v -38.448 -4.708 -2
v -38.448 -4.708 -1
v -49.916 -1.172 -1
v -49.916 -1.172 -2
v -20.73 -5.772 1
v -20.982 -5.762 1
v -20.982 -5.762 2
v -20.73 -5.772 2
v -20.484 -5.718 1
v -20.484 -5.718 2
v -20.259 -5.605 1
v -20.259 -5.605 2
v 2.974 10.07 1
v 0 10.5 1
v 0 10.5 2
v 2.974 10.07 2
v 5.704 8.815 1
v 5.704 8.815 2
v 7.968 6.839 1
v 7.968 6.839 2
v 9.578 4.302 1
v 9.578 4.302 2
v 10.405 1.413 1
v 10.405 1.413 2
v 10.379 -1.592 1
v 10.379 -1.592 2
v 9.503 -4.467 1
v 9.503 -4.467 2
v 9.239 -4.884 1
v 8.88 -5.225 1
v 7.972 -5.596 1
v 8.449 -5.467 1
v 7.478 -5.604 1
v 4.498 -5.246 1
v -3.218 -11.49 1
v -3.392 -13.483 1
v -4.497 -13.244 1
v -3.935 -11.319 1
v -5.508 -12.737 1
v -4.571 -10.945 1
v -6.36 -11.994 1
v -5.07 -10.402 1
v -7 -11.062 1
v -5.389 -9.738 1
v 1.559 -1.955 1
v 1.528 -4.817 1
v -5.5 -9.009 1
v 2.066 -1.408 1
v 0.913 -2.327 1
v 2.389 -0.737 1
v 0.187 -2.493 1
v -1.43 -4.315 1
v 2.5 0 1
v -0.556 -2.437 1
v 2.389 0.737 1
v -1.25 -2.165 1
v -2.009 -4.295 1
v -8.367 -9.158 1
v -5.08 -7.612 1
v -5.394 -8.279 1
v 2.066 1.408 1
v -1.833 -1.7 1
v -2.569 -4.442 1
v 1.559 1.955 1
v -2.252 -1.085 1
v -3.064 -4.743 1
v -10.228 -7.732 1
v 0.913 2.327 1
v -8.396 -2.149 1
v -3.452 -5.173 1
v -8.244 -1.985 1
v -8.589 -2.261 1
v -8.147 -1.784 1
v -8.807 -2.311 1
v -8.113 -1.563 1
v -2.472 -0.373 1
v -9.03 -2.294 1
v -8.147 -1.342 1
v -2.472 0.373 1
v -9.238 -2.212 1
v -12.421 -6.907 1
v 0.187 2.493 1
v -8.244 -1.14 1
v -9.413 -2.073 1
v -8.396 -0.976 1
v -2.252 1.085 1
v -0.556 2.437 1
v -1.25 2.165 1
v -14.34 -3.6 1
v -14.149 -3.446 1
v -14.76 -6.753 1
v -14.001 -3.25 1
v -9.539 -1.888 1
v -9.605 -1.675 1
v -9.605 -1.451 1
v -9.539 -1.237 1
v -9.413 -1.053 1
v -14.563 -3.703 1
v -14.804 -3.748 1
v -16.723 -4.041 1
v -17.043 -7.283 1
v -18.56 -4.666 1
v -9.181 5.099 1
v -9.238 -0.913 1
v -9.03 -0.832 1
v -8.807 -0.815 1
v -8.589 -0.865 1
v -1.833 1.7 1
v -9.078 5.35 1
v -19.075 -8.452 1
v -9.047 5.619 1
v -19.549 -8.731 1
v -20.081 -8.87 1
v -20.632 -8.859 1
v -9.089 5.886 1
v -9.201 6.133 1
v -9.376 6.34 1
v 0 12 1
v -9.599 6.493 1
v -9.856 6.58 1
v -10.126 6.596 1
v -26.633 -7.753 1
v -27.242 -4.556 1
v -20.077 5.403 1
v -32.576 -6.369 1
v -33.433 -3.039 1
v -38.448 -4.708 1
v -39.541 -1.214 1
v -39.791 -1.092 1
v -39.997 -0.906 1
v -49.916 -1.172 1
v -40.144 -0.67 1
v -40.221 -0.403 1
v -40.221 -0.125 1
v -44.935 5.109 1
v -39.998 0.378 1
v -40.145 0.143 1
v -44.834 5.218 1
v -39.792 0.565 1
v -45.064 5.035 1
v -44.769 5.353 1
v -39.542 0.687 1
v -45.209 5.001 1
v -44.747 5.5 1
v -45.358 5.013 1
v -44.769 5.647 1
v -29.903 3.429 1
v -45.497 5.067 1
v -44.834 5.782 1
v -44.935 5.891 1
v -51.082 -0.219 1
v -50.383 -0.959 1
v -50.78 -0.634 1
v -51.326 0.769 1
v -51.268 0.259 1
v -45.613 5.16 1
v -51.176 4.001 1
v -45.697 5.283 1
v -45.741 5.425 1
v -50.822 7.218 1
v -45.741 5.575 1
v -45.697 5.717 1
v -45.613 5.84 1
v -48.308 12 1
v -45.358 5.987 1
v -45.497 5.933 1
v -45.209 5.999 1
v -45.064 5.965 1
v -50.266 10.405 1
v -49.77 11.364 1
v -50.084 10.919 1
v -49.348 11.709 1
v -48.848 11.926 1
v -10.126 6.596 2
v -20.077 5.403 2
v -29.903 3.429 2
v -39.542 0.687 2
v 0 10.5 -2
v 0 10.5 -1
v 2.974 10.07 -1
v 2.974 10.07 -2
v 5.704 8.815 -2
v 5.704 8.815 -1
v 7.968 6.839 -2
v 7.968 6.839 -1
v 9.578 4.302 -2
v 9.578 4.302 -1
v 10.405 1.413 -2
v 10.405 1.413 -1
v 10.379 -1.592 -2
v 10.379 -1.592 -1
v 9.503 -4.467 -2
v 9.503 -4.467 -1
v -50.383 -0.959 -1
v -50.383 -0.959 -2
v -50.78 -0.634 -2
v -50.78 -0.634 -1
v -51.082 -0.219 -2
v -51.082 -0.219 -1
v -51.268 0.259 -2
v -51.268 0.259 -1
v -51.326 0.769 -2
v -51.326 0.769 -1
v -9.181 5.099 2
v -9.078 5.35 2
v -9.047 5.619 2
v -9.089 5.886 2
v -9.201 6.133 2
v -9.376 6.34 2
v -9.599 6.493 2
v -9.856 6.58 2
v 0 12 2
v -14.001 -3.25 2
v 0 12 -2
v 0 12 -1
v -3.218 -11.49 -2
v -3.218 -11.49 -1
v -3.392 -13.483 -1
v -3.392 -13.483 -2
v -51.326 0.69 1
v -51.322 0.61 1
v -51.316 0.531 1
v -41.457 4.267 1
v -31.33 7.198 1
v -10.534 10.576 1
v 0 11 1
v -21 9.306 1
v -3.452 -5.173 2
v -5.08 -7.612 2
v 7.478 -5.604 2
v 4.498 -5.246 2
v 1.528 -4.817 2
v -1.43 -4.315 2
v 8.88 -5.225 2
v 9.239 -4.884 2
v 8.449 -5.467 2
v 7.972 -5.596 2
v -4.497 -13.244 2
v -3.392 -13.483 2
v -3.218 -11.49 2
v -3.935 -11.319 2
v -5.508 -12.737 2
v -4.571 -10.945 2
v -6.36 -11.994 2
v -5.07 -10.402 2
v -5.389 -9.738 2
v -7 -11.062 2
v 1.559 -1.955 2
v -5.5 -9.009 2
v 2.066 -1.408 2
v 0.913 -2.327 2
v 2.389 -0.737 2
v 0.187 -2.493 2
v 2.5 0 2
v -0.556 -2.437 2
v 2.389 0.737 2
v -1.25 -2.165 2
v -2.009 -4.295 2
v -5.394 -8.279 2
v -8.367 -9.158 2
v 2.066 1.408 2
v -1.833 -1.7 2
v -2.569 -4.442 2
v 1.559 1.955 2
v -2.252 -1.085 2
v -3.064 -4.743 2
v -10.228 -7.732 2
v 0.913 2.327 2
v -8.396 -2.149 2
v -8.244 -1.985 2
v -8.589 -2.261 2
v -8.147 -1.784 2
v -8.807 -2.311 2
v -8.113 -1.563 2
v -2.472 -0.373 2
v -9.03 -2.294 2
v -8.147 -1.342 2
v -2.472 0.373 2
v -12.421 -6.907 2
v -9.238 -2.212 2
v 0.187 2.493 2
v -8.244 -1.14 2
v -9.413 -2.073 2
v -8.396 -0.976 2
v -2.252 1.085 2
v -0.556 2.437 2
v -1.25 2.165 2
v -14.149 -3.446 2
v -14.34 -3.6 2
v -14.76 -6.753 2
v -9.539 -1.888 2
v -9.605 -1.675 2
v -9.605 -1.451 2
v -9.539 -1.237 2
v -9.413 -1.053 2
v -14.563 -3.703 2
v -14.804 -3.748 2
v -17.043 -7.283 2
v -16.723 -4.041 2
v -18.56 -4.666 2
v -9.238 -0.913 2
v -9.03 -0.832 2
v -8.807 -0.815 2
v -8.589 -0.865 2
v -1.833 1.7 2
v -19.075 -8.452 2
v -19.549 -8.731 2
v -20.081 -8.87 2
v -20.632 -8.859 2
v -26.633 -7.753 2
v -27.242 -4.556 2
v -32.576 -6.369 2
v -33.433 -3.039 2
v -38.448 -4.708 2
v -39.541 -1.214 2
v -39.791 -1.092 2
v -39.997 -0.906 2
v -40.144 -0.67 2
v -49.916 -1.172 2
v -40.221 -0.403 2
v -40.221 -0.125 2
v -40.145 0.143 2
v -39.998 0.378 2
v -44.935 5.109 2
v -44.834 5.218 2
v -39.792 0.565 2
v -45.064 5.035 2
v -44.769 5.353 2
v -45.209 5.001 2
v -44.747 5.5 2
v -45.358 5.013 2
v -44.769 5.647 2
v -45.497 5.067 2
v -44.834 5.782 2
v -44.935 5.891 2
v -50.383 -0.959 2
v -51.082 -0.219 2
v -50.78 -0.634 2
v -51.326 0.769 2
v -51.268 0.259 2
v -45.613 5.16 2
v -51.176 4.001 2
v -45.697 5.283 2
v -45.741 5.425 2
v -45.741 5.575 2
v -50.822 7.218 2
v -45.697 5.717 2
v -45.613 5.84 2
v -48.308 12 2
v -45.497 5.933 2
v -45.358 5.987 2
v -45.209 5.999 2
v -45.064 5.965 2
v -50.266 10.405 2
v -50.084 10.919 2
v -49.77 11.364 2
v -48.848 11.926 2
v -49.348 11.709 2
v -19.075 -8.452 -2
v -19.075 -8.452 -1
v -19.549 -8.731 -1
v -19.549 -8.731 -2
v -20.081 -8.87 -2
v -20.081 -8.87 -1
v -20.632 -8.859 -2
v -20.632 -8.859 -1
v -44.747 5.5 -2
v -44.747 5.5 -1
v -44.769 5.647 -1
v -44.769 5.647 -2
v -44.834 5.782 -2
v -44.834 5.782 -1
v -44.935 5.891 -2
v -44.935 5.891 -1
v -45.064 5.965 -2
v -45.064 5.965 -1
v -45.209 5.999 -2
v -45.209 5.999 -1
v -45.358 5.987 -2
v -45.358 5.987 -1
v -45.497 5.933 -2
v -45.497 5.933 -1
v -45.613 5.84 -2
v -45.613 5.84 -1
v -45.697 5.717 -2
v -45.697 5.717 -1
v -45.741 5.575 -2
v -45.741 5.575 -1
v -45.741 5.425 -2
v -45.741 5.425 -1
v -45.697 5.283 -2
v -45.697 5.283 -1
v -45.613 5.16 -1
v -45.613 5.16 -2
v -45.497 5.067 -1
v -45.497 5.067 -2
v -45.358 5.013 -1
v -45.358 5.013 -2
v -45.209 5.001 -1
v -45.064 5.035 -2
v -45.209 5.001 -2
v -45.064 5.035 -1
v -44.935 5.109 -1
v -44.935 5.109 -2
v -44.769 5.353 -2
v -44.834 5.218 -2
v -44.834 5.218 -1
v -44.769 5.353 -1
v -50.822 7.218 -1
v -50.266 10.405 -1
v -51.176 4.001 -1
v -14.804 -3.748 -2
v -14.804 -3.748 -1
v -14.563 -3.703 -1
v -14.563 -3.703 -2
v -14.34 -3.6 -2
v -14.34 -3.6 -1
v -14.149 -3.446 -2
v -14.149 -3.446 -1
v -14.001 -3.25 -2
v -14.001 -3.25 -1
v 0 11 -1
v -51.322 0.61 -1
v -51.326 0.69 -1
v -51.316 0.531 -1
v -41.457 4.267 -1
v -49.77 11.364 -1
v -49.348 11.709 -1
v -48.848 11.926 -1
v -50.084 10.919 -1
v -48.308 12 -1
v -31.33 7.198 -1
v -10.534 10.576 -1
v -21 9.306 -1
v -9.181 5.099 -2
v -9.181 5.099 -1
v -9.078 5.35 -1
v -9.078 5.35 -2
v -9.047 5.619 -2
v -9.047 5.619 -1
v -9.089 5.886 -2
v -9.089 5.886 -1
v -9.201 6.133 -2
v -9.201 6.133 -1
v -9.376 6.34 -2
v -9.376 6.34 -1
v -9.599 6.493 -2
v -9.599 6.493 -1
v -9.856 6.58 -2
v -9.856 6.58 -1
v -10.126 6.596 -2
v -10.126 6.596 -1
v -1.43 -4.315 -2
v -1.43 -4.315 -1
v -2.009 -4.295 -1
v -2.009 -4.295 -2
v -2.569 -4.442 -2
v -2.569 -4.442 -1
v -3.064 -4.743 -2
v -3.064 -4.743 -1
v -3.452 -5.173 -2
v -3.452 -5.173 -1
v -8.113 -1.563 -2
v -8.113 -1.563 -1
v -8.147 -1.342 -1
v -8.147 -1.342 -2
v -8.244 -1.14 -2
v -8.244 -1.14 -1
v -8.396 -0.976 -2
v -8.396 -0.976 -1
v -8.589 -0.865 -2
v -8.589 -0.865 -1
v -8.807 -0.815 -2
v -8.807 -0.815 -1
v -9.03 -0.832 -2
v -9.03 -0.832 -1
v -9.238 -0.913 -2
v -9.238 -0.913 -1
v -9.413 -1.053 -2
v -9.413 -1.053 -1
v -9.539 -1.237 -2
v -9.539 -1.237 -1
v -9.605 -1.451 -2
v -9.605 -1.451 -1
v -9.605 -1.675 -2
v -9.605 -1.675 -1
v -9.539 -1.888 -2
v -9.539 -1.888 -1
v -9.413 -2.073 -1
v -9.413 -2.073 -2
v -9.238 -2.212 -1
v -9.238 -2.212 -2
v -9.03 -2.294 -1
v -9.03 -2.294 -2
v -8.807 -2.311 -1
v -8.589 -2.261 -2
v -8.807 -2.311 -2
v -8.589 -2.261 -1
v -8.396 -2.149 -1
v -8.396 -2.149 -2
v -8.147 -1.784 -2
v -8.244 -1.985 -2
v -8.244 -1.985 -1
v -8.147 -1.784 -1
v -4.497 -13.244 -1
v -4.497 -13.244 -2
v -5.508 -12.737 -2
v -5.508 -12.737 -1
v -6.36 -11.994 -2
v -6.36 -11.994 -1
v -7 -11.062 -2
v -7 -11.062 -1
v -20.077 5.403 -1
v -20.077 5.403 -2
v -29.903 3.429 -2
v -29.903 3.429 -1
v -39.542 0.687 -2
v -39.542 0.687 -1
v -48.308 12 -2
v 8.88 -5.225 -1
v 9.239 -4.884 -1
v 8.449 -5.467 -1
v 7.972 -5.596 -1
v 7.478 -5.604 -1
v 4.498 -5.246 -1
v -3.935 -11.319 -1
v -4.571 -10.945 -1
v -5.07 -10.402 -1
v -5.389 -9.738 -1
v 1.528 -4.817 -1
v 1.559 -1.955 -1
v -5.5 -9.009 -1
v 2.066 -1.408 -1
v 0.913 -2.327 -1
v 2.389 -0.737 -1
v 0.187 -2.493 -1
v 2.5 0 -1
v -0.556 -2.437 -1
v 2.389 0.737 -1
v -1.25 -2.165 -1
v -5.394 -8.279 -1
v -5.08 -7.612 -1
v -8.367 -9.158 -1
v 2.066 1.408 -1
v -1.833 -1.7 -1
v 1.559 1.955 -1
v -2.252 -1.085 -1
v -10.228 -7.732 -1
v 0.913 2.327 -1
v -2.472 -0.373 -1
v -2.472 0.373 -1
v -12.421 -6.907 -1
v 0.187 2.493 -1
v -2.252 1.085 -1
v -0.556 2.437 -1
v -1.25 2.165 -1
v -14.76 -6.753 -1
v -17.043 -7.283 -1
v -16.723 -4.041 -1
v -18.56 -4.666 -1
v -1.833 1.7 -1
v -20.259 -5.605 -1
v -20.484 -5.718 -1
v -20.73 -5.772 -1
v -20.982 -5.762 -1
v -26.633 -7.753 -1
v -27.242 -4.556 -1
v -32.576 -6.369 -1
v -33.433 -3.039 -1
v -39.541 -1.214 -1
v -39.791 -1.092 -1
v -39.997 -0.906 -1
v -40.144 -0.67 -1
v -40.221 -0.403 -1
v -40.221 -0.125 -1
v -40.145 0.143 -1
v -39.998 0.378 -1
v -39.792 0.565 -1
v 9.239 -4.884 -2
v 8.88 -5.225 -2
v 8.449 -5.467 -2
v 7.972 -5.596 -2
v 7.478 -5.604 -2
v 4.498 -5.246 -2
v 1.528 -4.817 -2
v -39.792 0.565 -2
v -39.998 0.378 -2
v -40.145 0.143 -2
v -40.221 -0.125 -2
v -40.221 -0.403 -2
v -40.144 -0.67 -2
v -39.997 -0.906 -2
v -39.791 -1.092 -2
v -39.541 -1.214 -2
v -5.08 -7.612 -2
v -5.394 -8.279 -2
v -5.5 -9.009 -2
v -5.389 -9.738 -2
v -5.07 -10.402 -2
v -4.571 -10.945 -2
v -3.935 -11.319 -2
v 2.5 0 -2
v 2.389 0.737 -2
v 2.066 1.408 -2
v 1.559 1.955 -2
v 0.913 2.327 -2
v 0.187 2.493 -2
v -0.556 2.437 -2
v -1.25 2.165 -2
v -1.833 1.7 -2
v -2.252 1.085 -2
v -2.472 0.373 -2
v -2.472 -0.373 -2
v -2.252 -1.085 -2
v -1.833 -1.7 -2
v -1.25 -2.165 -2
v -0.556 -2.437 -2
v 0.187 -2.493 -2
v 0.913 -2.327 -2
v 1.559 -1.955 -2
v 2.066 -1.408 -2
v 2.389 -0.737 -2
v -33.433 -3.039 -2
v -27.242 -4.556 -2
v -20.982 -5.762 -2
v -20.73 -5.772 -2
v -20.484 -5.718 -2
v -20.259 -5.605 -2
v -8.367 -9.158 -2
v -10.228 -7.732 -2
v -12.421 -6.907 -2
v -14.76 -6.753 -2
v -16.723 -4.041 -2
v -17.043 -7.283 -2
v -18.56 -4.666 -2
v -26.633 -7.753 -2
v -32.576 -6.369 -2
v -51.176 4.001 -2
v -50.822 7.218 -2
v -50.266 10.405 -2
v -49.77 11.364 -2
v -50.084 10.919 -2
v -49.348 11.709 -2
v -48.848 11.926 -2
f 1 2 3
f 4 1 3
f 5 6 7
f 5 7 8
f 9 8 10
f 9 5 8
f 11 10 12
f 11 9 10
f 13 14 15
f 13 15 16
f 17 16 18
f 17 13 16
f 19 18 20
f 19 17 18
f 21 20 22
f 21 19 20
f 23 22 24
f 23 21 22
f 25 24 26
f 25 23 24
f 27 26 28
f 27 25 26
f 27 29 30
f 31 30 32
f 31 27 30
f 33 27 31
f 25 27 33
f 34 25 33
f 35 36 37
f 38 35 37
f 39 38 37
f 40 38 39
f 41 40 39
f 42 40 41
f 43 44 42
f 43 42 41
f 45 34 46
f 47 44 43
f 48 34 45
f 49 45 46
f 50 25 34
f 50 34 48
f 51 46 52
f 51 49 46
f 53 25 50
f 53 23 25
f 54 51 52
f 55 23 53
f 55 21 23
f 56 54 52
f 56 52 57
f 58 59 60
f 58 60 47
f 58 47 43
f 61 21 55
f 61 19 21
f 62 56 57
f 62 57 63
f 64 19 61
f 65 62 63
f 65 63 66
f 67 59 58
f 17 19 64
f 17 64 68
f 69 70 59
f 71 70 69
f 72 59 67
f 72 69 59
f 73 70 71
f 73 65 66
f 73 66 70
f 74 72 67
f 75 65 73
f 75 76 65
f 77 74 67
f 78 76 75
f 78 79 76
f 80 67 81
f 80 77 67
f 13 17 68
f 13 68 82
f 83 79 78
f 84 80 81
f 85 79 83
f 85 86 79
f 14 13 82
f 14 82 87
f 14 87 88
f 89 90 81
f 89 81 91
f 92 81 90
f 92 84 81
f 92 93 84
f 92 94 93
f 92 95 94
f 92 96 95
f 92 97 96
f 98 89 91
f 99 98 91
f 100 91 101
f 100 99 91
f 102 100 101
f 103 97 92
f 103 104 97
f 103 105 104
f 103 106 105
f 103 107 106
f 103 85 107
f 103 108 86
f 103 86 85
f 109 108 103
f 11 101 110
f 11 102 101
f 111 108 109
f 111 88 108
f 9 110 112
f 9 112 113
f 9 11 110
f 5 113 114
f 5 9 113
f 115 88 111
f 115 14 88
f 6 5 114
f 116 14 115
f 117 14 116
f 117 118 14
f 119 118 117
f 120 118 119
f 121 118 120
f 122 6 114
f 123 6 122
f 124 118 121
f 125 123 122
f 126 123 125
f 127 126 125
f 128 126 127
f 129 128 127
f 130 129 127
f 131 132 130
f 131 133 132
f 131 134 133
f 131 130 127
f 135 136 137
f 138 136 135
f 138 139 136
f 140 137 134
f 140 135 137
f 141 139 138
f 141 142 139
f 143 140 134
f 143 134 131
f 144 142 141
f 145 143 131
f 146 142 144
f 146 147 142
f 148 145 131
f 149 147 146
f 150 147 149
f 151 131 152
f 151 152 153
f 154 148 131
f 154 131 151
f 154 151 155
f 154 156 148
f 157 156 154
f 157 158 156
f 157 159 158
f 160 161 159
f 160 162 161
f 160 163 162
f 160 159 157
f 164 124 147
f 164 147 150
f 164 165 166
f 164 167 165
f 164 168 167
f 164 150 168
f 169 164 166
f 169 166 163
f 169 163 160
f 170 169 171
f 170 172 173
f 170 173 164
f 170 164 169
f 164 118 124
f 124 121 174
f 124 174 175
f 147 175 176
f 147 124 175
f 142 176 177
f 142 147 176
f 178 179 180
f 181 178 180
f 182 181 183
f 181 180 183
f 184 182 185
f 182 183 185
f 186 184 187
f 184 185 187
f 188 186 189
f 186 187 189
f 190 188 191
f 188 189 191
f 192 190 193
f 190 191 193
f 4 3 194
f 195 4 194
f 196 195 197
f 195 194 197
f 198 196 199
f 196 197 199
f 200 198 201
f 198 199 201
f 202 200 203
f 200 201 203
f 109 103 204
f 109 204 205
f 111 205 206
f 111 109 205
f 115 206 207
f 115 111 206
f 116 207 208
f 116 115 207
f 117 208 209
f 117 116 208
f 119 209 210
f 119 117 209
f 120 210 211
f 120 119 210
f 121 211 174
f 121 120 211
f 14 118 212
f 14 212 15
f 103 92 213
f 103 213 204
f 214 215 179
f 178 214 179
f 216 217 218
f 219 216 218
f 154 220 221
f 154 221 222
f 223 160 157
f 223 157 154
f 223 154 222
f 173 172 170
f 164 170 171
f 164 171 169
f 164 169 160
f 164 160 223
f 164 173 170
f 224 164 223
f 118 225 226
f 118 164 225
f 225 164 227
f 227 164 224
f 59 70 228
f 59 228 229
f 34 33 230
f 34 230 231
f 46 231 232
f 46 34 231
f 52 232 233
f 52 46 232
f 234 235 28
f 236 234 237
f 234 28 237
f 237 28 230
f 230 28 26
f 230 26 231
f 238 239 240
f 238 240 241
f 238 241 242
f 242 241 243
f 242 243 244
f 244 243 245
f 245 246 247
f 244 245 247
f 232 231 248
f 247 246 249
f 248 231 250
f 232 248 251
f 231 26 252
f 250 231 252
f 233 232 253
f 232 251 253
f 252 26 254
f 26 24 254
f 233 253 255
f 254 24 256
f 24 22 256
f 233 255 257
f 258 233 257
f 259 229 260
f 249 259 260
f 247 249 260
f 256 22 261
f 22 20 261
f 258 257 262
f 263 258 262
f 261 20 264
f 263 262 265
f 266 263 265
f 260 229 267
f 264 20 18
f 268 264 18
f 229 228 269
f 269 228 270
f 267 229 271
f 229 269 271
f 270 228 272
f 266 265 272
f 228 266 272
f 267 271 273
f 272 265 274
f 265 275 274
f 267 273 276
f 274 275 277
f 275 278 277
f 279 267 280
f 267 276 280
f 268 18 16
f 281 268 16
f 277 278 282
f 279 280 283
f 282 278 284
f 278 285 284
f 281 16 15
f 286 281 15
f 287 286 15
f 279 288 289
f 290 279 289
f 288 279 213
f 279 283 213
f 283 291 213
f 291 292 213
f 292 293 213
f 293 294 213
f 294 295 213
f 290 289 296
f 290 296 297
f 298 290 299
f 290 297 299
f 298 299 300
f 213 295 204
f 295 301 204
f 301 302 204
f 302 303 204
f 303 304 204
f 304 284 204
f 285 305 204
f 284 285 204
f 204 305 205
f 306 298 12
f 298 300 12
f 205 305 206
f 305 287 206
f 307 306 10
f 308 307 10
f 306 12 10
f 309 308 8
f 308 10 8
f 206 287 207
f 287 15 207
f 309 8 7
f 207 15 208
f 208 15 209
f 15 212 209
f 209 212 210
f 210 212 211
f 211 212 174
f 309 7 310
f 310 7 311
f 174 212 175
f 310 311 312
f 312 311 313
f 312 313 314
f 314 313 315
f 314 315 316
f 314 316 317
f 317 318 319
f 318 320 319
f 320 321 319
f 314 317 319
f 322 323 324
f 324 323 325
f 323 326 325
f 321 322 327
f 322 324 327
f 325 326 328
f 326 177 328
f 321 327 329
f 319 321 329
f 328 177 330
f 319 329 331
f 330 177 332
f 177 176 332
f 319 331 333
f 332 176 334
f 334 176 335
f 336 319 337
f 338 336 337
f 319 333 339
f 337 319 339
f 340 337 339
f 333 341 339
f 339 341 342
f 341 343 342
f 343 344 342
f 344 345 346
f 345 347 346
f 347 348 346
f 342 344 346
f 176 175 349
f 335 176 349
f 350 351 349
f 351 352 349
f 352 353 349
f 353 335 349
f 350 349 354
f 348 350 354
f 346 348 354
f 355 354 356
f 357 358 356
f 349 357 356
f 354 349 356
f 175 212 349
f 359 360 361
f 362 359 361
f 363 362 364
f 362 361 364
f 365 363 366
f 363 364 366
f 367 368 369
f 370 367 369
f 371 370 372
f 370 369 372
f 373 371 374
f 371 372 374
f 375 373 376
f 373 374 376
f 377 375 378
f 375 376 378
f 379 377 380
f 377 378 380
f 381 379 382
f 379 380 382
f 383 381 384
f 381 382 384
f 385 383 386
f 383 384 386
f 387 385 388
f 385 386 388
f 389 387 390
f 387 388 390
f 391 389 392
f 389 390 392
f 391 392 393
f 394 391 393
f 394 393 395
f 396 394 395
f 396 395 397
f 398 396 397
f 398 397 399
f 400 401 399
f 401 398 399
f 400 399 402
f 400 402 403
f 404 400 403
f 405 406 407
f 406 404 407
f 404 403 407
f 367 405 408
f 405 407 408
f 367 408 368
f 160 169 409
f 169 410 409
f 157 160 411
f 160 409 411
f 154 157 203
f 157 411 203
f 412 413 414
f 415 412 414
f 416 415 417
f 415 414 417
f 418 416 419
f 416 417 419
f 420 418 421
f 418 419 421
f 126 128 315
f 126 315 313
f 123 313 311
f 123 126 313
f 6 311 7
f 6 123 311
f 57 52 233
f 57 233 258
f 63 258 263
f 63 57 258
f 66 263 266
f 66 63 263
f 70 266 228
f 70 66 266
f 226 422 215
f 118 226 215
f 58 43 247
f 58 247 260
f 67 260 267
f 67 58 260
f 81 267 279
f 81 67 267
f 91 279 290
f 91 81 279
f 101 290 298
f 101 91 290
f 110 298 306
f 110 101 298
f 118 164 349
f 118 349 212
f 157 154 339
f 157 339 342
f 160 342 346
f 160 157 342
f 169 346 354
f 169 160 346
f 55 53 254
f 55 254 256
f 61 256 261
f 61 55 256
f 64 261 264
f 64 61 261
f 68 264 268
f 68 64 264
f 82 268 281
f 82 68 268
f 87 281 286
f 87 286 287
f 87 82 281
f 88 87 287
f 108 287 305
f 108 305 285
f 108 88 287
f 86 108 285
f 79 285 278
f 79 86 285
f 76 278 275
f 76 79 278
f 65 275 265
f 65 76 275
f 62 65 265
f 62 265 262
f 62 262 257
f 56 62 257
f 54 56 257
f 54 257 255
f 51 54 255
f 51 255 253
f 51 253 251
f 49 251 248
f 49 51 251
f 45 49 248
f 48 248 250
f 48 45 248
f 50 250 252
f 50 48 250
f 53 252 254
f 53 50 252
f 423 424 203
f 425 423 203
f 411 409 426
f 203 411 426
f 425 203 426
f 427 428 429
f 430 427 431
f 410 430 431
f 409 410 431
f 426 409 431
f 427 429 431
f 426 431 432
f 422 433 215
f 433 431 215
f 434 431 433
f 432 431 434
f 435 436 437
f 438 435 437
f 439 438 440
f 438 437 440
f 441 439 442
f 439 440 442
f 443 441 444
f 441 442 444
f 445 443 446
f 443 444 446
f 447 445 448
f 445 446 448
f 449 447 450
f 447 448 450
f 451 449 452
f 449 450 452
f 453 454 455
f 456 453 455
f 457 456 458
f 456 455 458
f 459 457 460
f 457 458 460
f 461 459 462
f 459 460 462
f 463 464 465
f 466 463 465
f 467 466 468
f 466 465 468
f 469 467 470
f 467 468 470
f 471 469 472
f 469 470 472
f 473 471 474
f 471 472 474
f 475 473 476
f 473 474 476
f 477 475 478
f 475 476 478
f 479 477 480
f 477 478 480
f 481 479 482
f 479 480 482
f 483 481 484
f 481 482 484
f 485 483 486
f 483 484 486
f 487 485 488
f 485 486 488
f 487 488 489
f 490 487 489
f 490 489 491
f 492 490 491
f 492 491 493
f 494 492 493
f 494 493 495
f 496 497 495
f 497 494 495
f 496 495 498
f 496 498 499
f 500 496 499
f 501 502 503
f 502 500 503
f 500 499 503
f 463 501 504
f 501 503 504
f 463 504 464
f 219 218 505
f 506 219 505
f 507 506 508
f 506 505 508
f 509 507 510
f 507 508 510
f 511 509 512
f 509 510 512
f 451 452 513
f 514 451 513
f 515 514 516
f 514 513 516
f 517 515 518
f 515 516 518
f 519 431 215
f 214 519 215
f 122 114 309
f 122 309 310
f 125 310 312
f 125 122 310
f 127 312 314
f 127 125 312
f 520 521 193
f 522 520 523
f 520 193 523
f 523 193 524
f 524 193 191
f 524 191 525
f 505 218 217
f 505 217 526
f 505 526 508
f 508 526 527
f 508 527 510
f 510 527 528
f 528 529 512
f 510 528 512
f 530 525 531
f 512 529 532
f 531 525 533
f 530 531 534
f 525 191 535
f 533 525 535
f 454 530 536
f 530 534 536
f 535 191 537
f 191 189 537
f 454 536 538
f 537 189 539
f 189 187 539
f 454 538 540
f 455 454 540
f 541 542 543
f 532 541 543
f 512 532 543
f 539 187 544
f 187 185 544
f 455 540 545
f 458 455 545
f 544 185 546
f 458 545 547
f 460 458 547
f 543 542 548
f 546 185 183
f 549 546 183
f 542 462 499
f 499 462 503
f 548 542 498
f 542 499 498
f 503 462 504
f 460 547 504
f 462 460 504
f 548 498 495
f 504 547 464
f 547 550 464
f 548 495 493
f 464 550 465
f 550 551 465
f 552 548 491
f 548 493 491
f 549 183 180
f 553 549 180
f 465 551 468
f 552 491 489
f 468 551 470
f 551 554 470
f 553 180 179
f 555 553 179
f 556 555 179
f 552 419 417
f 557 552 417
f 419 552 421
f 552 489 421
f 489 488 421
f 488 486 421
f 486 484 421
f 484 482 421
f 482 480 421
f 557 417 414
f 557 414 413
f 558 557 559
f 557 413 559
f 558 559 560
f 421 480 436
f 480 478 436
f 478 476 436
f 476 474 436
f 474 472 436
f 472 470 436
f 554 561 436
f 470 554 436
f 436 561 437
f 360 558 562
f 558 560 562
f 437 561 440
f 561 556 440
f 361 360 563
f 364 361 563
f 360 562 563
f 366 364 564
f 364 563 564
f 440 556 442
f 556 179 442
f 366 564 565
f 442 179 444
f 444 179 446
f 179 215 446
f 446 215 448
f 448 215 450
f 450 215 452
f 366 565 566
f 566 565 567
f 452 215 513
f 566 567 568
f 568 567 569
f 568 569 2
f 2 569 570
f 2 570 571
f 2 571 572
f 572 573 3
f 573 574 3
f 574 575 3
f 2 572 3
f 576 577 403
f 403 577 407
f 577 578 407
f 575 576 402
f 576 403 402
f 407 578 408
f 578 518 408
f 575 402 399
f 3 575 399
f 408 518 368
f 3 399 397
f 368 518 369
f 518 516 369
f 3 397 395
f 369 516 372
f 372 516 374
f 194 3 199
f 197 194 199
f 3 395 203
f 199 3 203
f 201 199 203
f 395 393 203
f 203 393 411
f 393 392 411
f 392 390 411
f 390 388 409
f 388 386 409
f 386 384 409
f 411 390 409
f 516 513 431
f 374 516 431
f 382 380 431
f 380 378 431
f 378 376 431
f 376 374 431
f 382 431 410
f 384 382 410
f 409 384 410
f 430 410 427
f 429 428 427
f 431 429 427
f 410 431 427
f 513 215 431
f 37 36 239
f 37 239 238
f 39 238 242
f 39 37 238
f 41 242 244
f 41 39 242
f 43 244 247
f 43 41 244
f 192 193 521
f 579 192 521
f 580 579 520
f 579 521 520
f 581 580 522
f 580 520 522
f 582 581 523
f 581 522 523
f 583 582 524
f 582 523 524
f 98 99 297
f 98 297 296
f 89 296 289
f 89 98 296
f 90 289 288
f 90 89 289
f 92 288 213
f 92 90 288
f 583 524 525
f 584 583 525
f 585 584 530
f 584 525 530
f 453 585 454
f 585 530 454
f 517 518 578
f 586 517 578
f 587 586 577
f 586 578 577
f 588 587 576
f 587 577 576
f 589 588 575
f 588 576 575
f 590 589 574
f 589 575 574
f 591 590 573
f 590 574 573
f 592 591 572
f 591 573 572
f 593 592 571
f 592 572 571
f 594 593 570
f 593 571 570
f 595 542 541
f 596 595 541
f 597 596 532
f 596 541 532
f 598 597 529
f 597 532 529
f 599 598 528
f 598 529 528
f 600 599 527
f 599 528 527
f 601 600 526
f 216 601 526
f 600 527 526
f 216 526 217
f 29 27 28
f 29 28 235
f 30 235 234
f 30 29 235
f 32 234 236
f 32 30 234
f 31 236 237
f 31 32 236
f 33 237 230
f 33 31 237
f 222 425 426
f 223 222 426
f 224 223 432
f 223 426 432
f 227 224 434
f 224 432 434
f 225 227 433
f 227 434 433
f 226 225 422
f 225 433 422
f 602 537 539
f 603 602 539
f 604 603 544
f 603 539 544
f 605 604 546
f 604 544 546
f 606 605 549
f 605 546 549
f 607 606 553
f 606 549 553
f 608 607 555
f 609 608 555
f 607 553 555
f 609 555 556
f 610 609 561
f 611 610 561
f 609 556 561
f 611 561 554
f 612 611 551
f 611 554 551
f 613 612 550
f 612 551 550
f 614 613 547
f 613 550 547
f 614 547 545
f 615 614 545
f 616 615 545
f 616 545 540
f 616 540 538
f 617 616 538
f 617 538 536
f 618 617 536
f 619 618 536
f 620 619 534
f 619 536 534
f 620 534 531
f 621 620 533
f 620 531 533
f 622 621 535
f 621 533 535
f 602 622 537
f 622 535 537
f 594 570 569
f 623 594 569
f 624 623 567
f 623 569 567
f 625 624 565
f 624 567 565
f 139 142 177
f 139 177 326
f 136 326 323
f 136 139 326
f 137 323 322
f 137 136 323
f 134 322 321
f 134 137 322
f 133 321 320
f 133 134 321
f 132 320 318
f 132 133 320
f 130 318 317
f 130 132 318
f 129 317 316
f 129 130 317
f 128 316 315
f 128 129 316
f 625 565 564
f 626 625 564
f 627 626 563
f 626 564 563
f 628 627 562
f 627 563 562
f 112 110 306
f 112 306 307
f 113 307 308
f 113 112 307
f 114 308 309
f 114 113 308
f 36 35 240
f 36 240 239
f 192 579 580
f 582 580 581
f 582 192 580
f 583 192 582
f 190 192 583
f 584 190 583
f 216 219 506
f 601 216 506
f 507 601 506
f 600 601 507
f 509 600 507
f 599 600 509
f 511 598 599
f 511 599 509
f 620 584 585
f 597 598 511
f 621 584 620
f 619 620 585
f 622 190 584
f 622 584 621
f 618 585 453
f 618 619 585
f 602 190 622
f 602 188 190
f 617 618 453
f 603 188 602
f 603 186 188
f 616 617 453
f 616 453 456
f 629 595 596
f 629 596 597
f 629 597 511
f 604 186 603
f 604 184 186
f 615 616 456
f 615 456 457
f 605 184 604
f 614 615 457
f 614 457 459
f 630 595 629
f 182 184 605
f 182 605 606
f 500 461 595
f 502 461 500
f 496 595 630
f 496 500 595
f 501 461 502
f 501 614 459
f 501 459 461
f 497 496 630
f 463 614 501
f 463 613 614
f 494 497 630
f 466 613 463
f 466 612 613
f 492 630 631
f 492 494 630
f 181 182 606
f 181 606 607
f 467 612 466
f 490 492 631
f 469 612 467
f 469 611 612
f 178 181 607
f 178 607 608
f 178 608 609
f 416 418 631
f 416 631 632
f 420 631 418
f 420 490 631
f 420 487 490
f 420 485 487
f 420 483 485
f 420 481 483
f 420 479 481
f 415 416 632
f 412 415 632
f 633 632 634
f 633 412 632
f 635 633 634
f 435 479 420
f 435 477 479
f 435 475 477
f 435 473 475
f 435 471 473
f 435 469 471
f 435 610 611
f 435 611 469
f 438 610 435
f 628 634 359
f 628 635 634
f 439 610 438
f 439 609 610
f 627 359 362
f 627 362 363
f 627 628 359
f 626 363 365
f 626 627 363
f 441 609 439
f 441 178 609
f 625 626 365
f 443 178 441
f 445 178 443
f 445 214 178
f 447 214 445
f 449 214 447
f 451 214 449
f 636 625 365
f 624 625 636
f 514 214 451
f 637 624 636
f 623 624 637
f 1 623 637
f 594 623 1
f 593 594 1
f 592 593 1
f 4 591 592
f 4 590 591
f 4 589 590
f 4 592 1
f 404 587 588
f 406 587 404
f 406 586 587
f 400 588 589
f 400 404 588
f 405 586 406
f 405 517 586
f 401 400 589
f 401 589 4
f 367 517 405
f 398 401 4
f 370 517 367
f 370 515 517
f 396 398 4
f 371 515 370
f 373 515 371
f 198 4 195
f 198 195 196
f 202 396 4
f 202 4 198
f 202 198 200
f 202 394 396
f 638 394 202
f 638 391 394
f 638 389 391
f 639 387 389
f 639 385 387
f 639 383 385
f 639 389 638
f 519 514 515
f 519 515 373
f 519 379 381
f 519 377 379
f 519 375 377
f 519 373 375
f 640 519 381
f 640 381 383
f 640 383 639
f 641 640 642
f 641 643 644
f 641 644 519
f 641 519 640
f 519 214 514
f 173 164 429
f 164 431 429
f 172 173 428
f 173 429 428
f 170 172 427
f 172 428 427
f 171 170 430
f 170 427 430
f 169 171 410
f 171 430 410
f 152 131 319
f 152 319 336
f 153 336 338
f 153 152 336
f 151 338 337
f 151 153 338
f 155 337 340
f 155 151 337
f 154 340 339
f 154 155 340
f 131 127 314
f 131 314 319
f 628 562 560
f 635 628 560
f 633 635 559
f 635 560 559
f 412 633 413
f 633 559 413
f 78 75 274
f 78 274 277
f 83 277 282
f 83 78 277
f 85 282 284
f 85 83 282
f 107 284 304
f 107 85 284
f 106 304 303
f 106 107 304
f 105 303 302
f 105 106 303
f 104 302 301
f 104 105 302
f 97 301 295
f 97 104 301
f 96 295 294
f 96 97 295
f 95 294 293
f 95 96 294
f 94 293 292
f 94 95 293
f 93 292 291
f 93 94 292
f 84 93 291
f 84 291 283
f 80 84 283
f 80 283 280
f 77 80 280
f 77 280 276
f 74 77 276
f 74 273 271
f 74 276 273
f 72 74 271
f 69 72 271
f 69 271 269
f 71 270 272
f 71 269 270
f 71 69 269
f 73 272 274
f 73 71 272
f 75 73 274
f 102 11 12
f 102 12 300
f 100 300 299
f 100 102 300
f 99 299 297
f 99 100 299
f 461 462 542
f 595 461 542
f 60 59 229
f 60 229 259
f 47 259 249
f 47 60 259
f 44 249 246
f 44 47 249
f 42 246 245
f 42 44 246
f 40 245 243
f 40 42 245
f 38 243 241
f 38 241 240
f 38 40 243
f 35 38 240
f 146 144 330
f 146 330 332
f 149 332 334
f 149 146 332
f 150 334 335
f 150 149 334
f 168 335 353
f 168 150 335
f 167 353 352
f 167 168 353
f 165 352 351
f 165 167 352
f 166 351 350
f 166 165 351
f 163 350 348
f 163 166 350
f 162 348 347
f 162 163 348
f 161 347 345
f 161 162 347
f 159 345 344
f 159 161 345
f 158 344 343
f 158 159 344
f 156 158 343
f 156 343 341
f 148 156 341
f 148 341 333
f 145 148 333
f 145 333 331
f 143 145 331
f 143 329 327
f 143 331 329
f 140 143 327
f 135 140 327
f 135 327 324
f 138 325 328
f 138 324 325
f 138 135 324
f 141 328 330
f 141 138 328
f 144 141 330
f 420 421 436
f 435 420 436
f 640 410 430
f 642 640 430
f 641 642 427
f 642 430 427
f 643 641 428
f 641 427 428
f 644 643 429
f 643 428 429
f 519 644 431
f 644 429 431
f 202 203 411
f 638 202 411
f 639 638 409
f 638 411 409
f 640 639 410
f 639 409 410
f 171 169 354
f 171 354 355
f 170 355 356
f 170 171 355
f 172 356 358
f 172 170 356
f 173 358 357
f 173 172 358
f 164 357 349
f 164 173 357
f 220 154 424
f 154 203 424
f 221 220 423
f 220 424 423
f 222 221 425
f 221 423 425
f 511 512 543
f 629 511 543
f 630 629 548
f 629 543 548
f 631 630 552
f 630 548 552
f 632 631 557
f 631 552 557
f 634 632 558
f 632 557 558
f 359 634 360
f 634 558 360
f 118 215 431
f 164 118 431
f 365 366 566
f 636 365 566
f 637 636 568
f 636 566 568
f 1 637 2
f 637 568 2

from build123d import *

# Parameters (mm, degrees)
SKICA1_R                 = 2.5
P_IDAT_VYSUNUT_M1_DEPTH  = 1
ODEBRAT_VYSUNUT_M3_DEPTH = 54.105492035
SKICA2_R                 = 0.75
SKICA2_R_2               = 0.5
ODEBRAT_VYSUNUT_M2_DEPTH = 54.105492035
P_IDAT_VYSUNUT_M2_DEPTH  = 1


with BuildPart() as part:
    # Skica1 → Přidat vysunutím1 (new body)
    with BuildSketch(Plane.XY.offset(1)):
        with BuildLine():
            Line((-3.451850397, -5.17306034), (-5.079542319, -7.612374783))
            ThreePointArc((-5.079542319, -7.612374783), (-5.253771545, -10.081902872), (-3.217889357, -11.490486745))
            Line((-3.217889357, -11.490486745), (-3.392200842, -13.482876141))
            ThreePointArc((-3.392200842, -13.482876141), (-5.507699887, -12.736501208), (-7, -11.061552813))
            ThreePointArc((-7, -11.061552813), (-12.421451418, -6.907005546), (-19.074569669, -8.452455647))
            ThreePointArc((-19.074569669, -8.452455647), (-19.810429728, -8.819128255), (-20.631627839, -8.858782909))
            ThreePointArc((-20.631627839, -8.858782909), (-29.612816832, -7.095755552), (-38.448343472, -4.707557447))
            Line((-38.448343472, -4.707557447), (-49.915705076, -1.172077587))
            ThreePointArc((-49.915705076, -1.172077587), (-50.944425281, -0.436513563), (-51.326233925, 0.769115673))
            ThreePointArc((-51.326233925, 0.769115673), (-51.024263074, 5.612344033), (-50.266302206, 10.405416394))
            ThreePointArc((-50.266302206, 10.405416394), (-49.570592062, 11.550940487), (-48.307823831, 12))
            Line((-48.307823831, 12), (0, 12))
            Line((0, 12), (0, 10.5))
            ThreePointArc((0, 10.5), (8.864205709, 5.628130874), (9.502649492, -4.466503402))
            ThreePointArc((9.502649492, -4.466503402), (8.672376262, -5.35932327), (7.478006155, -5.604192624))
            ThreePointArc((7.478006155, -5.604192624), (3.01210543, -5.04033823), (-1.430493256, -4.315412042))
            ThreePointArc((-1.430493256, -4.315412042), (-2.569395622, -4.442030631), (-3.451850397, -5.17306034))
        make_face()
        Circle(SKICA1_R, mode=Mode.SUBTRACT)
    extrude(amount=P_IDAT_VYSUNUT_M1_DEPTH)

    # Skica14 → Odebrat vysunutím3 (cut, through all)
    with BuildSketch(Plane.XY):
        with BuildLine():
            Line((-14.000954762, -3.250365002), (-9.180543984, 5.098831378))
            ThreePointArc((-9.180543984, 5.098831378), (-9.201183144, 6.132986878), (-10.126304066, 6.5956475))
            ThreePointArc((-10.126304066, 6.5956475), (-25.0093231, 4.513187085), (-39.5421575, 0.687272652))
            ThreePointArc((-39.5421575, 0.687272652), (-40.23080172, -0.263668209), (-39.540926846, -1.21371665))
            ThreePointArc((-39.540926846, -1.21371665), (-30.346748023, -3.835878825), (-20.981929874, -5.761713644))
            ThreePointArc((-20.981929874, -5.761713644), (-20.60514794, -5.752569661), (-20.258511168, -5.604612957))
            ThreePointArc((-20.258511168, -5.604612957), (-17.654944999, -4.313023149), (-14.803991078, -3.748379218))
            ThreePointArc((-14.803991078, -3.748379218), (-14.339939825, -3.600205269), (-14.000954762, -3.250365002))
        make_face()
    extrude(amount=ODEBRAT_VYSUNUT_M3_DEPTH, mode=Mode.SUBTRACT)

    # Skica2 → Odebrat vysunutím2 (cut, through all)
    with BuildSketch(Plane.XY):
        with Locations((-8.863269777, -1.562833599)):
            Circle(SKICA2_R)
        with Locations((-45.246630015, 5.5)):
            Circle(SKICA2_R_2)
    extrude(amount=ODEBRAT_VYSUNUT_M2_DEPTH, mode=Mode.SUBTRACT)


with BuildPart() as body_2:
    # Skica16 → Přidat vysunutím2 (new, symmetric)
    with BuildSketch(Plane(origin=(0, 0, 0), x_dir=(-1, 0, 0), z_dir=(0, 0, -1))):
        with BuildLine():
            Line((0, 12), (48.307823831, 12))
            ThreePointArc((48.307823831, 12), (49.570592062, 11.550940487), (50.266302206, 10.405416394))
            ThreePointArc((50.266302206, 10.405416394), (51.024263074, 5.612344033), (51.326233925, 0.769115673))
            ThreePointArc((51.326233925, 0.769115673), (51.324464931, 0.649874315), (51.31559221, 0.530950366))
            ThreePointArc((51.31559221, 0.530950366), (26.186308465, 8.356056534), (0, 11))
            Line((0, 11), (0, 12))
        make_face()
    extrude(amount=P_IDAT_VYSUNUT_M2_DEPTH, both=True)


with BuildPart() as body_3:
    # Zrcadlit1: mirrored copy
    add(part.part.mirror(Plane.XY))


solid = Compound([part.part, body_2.part, body_3.part])
